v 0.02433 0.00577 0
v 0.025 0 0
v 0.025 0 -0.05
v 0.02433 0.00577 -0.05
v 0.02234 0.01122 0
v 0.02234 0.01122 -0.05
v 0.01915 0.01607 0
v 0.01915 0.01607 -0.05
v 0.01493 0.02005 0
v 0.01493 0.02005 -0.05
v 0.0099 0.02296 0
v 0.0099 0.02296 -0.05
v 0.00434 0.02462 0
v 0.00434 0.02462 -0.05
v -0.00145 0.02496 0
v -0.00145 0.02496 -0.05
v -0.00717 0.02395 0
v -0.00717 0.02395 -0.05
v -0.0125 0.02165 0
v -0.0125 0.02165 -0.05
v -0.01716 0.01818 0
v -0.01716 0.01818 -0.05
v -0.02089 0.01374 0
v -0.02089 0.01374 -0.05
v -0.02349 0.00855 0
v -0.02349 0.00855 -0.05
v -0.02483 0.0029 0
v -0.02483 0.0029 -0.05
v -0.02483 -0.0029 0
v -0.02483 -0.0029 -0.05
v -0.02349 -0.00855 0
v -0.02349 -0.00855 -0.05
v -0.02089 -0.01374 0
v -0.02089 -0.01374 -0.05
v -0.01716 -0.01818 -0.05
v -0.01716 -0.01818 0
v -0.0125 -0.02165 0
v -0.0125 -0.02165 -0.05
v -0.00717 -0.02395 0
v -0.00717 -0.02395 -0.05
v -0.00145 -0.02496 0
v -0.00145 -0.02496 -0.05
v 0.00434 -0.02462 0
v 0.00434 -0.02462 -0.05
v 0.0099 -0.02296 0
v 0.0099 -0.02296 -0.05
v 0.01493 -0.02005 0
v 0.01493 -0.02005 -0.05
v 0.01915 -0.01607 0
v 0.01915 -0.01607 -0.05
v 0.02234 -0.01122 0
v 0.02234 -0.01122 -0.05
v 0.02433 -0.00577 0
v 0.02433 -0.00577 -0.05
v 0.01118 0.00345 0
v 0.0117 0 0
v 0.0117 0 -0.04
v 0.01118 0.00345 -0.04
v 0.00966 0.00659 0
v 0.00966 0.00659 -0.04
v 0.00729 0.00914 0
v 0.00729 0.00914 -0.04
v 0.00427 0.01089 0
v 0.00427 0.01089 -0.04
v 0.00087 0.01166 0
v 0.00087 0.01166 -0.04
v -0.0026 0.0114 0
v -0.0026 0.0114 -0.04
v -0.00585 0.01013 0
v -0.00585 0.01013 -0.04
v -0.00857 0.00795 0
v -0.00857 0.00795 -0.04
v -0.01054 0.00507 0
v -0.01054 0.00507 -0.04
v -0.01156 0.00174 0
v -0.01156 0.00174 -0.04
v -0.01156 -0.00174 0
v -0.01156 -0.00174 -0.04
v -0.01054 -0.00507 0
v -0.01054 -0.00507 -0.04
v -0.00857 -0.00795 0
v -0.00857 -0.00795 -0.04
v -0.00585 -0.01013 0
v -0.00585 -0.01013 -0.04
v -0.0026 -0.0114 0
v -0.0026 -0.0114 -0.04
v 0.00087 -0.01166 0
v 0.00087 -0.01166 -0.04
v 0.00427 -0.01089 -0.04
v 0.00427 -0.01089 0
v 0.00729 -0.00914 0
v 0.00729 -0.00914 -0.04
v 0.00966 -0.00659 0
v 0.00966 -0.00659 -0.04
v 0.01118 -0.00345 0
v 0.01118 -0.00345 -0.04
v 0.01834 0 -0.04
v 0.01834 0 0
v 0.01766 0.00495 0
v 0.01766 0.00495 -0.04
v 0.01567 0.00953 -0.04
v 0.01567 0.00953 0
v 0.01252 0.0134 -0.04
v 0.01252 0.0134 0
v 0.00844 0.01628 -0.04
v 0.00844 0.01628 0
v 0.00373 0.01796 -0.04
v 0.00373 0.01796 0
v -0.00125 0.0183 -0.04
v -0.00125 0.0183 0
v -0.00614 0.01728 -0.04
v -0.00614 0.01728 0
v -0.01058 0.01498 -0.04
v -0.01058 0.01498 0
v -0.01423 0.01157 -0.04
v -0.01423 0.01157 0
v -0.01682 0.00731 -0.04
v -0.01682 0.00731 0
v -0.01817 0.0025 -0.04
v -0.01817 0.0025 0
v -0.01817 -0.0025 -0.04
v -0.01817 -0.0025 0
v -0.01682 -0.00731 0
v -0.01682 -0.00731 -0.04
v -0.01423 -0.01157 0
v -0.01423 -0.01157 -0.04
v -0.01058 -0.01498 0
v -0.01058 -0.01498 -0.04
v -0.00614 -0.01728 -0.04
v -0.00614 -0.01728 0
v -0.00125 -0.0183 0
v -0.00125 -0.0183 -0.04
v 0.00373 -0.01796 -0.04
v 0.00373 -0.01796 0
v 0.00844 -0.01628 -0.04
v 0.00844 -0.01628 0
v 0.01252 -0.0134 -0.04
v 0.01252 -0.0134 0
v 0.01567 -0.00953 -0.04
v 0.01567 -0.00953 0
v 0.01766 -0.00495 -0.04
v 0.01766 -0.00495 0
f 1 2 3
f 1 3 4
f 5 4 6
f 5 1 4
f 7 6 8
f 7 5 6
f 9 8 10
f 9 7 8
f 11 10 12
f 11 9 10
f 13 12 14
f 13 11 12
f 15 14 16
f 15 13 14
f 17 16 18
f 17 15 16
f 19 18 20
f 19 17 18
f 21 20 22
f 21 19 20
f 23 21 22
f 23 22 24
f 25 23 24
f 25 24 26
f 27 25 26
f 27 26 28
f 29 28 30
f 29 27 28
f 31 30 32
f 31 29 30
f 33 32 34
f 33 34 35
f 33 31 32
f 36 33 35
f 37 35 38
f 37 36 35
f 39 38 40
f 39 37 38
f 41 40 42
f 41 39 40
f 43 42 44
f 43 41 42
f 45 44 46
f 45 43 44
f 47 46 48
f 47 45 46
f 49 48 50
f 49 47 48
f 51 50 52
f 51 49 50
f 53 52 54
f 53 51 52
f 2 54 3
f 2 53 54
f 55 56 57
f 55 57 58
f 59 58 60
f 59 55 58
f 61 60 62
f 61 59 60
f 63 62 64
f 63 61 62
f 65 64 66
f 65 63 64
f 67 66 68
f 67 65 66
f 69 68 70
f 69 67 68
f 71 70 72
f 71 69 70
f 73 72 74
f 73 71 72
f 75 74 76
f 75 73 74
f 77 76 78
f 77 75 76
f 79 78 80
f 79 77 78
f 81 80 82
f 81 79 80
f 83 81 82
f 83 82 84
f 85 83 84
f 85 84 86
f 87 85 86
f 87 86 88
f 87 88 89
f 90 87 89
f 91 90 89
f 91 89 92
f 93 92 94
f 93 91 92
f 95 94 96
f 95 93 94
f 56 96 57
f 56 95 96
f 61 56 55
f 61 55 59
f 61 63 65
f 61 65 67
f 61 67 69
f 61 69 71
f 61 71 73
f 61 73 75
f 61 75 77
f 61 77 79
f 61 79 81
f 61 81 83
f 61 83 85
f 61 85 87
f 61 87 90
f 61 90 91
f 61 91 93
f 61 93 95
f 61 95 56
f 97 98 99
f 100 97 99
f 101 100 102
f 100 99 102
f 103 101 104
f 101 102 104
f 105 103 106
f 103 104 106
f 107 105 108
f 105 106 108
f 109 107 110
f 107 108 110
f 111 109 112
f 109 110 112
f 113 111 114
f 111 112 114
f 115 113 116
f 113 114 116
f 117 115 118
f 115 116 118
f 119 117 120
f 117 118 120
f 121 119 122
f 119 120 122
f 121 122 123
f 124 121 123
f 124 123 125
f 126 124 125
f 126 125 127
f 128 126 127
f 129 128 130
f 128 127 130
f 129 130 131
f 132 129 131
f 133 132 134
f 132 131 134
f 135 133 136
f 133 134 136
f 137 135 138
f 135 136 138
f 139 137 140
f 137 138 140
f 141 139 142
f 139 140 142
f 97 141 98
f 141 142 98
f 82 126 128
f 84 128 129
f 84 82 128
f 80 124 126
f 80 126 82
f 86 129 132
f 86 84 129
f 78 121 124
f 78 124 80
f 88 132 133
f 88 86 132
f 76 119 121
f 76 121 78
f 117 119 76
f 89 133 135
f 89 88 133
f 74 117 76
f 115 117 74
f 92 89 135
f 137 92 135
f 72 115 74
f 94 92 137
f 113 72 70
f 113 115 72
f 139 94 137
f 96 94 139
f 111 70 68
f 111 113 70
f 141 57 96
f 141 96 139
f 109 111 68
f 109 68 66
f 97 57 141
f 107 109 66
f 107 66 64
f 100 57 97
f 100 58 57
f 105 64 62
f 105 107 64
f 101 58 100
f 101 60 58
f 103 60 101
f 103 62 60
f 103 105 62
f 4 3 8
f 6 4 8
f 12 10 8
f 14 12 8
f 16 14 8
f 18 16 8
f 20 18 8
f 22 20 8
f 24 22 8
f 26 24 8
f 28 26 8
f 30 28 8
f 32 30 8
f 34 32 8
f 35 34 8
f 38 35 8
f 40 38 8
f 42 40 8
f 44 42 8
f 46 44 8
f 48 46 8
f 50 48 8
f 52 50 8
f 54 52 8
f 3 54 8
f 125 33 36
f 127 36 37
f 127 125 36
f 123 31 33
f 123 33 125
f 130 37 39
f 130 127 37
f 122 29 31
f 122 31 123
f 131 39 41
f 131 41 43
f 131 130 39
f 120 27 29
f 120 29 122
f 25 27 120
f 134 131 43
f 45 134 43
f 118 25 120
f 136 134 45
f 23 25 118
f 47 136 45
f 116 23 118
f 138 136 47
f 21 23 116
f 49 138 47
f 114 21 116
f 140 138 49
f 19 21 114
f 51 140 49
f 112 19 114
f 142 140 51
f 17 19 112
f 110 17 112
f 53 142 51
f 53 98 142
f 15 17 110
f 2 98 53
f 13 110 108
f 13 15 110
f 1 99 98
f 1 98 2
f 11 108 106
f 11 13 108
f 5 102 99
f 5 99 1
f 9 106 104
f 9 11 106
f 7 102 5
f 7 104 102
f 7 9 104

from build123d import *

# Parameters (mm, degrees)
SKETCH1_R      = 0.025
EXTRUDE1_DEPTH = 0.05
SKETCH2_R      = 0.018340358
SKETCH2_R_2    = 0.011695172
EXTRUDE2_DEPTH = 0.04


with BuildPart() as part:
    # Sketch1 → Extrude1 (new body)
    with BuildSketch(Plane.XY):
        Circle(SKETCH1_R)
    extrude(amount=-EXTRUDE1_DEPTH)

    # Sketch2 → Extrude2 (cut)
    with BuildSketch(Plane.XY):
        Circle(SKETCH2_R)
        Circle(SKETCH2_R_2, mode=Mode.SUBTRACT)
    extrude(amount=-EXTRUDE2_DEPTH, mode=Mode.SUBTRACT)


solid = part.part
